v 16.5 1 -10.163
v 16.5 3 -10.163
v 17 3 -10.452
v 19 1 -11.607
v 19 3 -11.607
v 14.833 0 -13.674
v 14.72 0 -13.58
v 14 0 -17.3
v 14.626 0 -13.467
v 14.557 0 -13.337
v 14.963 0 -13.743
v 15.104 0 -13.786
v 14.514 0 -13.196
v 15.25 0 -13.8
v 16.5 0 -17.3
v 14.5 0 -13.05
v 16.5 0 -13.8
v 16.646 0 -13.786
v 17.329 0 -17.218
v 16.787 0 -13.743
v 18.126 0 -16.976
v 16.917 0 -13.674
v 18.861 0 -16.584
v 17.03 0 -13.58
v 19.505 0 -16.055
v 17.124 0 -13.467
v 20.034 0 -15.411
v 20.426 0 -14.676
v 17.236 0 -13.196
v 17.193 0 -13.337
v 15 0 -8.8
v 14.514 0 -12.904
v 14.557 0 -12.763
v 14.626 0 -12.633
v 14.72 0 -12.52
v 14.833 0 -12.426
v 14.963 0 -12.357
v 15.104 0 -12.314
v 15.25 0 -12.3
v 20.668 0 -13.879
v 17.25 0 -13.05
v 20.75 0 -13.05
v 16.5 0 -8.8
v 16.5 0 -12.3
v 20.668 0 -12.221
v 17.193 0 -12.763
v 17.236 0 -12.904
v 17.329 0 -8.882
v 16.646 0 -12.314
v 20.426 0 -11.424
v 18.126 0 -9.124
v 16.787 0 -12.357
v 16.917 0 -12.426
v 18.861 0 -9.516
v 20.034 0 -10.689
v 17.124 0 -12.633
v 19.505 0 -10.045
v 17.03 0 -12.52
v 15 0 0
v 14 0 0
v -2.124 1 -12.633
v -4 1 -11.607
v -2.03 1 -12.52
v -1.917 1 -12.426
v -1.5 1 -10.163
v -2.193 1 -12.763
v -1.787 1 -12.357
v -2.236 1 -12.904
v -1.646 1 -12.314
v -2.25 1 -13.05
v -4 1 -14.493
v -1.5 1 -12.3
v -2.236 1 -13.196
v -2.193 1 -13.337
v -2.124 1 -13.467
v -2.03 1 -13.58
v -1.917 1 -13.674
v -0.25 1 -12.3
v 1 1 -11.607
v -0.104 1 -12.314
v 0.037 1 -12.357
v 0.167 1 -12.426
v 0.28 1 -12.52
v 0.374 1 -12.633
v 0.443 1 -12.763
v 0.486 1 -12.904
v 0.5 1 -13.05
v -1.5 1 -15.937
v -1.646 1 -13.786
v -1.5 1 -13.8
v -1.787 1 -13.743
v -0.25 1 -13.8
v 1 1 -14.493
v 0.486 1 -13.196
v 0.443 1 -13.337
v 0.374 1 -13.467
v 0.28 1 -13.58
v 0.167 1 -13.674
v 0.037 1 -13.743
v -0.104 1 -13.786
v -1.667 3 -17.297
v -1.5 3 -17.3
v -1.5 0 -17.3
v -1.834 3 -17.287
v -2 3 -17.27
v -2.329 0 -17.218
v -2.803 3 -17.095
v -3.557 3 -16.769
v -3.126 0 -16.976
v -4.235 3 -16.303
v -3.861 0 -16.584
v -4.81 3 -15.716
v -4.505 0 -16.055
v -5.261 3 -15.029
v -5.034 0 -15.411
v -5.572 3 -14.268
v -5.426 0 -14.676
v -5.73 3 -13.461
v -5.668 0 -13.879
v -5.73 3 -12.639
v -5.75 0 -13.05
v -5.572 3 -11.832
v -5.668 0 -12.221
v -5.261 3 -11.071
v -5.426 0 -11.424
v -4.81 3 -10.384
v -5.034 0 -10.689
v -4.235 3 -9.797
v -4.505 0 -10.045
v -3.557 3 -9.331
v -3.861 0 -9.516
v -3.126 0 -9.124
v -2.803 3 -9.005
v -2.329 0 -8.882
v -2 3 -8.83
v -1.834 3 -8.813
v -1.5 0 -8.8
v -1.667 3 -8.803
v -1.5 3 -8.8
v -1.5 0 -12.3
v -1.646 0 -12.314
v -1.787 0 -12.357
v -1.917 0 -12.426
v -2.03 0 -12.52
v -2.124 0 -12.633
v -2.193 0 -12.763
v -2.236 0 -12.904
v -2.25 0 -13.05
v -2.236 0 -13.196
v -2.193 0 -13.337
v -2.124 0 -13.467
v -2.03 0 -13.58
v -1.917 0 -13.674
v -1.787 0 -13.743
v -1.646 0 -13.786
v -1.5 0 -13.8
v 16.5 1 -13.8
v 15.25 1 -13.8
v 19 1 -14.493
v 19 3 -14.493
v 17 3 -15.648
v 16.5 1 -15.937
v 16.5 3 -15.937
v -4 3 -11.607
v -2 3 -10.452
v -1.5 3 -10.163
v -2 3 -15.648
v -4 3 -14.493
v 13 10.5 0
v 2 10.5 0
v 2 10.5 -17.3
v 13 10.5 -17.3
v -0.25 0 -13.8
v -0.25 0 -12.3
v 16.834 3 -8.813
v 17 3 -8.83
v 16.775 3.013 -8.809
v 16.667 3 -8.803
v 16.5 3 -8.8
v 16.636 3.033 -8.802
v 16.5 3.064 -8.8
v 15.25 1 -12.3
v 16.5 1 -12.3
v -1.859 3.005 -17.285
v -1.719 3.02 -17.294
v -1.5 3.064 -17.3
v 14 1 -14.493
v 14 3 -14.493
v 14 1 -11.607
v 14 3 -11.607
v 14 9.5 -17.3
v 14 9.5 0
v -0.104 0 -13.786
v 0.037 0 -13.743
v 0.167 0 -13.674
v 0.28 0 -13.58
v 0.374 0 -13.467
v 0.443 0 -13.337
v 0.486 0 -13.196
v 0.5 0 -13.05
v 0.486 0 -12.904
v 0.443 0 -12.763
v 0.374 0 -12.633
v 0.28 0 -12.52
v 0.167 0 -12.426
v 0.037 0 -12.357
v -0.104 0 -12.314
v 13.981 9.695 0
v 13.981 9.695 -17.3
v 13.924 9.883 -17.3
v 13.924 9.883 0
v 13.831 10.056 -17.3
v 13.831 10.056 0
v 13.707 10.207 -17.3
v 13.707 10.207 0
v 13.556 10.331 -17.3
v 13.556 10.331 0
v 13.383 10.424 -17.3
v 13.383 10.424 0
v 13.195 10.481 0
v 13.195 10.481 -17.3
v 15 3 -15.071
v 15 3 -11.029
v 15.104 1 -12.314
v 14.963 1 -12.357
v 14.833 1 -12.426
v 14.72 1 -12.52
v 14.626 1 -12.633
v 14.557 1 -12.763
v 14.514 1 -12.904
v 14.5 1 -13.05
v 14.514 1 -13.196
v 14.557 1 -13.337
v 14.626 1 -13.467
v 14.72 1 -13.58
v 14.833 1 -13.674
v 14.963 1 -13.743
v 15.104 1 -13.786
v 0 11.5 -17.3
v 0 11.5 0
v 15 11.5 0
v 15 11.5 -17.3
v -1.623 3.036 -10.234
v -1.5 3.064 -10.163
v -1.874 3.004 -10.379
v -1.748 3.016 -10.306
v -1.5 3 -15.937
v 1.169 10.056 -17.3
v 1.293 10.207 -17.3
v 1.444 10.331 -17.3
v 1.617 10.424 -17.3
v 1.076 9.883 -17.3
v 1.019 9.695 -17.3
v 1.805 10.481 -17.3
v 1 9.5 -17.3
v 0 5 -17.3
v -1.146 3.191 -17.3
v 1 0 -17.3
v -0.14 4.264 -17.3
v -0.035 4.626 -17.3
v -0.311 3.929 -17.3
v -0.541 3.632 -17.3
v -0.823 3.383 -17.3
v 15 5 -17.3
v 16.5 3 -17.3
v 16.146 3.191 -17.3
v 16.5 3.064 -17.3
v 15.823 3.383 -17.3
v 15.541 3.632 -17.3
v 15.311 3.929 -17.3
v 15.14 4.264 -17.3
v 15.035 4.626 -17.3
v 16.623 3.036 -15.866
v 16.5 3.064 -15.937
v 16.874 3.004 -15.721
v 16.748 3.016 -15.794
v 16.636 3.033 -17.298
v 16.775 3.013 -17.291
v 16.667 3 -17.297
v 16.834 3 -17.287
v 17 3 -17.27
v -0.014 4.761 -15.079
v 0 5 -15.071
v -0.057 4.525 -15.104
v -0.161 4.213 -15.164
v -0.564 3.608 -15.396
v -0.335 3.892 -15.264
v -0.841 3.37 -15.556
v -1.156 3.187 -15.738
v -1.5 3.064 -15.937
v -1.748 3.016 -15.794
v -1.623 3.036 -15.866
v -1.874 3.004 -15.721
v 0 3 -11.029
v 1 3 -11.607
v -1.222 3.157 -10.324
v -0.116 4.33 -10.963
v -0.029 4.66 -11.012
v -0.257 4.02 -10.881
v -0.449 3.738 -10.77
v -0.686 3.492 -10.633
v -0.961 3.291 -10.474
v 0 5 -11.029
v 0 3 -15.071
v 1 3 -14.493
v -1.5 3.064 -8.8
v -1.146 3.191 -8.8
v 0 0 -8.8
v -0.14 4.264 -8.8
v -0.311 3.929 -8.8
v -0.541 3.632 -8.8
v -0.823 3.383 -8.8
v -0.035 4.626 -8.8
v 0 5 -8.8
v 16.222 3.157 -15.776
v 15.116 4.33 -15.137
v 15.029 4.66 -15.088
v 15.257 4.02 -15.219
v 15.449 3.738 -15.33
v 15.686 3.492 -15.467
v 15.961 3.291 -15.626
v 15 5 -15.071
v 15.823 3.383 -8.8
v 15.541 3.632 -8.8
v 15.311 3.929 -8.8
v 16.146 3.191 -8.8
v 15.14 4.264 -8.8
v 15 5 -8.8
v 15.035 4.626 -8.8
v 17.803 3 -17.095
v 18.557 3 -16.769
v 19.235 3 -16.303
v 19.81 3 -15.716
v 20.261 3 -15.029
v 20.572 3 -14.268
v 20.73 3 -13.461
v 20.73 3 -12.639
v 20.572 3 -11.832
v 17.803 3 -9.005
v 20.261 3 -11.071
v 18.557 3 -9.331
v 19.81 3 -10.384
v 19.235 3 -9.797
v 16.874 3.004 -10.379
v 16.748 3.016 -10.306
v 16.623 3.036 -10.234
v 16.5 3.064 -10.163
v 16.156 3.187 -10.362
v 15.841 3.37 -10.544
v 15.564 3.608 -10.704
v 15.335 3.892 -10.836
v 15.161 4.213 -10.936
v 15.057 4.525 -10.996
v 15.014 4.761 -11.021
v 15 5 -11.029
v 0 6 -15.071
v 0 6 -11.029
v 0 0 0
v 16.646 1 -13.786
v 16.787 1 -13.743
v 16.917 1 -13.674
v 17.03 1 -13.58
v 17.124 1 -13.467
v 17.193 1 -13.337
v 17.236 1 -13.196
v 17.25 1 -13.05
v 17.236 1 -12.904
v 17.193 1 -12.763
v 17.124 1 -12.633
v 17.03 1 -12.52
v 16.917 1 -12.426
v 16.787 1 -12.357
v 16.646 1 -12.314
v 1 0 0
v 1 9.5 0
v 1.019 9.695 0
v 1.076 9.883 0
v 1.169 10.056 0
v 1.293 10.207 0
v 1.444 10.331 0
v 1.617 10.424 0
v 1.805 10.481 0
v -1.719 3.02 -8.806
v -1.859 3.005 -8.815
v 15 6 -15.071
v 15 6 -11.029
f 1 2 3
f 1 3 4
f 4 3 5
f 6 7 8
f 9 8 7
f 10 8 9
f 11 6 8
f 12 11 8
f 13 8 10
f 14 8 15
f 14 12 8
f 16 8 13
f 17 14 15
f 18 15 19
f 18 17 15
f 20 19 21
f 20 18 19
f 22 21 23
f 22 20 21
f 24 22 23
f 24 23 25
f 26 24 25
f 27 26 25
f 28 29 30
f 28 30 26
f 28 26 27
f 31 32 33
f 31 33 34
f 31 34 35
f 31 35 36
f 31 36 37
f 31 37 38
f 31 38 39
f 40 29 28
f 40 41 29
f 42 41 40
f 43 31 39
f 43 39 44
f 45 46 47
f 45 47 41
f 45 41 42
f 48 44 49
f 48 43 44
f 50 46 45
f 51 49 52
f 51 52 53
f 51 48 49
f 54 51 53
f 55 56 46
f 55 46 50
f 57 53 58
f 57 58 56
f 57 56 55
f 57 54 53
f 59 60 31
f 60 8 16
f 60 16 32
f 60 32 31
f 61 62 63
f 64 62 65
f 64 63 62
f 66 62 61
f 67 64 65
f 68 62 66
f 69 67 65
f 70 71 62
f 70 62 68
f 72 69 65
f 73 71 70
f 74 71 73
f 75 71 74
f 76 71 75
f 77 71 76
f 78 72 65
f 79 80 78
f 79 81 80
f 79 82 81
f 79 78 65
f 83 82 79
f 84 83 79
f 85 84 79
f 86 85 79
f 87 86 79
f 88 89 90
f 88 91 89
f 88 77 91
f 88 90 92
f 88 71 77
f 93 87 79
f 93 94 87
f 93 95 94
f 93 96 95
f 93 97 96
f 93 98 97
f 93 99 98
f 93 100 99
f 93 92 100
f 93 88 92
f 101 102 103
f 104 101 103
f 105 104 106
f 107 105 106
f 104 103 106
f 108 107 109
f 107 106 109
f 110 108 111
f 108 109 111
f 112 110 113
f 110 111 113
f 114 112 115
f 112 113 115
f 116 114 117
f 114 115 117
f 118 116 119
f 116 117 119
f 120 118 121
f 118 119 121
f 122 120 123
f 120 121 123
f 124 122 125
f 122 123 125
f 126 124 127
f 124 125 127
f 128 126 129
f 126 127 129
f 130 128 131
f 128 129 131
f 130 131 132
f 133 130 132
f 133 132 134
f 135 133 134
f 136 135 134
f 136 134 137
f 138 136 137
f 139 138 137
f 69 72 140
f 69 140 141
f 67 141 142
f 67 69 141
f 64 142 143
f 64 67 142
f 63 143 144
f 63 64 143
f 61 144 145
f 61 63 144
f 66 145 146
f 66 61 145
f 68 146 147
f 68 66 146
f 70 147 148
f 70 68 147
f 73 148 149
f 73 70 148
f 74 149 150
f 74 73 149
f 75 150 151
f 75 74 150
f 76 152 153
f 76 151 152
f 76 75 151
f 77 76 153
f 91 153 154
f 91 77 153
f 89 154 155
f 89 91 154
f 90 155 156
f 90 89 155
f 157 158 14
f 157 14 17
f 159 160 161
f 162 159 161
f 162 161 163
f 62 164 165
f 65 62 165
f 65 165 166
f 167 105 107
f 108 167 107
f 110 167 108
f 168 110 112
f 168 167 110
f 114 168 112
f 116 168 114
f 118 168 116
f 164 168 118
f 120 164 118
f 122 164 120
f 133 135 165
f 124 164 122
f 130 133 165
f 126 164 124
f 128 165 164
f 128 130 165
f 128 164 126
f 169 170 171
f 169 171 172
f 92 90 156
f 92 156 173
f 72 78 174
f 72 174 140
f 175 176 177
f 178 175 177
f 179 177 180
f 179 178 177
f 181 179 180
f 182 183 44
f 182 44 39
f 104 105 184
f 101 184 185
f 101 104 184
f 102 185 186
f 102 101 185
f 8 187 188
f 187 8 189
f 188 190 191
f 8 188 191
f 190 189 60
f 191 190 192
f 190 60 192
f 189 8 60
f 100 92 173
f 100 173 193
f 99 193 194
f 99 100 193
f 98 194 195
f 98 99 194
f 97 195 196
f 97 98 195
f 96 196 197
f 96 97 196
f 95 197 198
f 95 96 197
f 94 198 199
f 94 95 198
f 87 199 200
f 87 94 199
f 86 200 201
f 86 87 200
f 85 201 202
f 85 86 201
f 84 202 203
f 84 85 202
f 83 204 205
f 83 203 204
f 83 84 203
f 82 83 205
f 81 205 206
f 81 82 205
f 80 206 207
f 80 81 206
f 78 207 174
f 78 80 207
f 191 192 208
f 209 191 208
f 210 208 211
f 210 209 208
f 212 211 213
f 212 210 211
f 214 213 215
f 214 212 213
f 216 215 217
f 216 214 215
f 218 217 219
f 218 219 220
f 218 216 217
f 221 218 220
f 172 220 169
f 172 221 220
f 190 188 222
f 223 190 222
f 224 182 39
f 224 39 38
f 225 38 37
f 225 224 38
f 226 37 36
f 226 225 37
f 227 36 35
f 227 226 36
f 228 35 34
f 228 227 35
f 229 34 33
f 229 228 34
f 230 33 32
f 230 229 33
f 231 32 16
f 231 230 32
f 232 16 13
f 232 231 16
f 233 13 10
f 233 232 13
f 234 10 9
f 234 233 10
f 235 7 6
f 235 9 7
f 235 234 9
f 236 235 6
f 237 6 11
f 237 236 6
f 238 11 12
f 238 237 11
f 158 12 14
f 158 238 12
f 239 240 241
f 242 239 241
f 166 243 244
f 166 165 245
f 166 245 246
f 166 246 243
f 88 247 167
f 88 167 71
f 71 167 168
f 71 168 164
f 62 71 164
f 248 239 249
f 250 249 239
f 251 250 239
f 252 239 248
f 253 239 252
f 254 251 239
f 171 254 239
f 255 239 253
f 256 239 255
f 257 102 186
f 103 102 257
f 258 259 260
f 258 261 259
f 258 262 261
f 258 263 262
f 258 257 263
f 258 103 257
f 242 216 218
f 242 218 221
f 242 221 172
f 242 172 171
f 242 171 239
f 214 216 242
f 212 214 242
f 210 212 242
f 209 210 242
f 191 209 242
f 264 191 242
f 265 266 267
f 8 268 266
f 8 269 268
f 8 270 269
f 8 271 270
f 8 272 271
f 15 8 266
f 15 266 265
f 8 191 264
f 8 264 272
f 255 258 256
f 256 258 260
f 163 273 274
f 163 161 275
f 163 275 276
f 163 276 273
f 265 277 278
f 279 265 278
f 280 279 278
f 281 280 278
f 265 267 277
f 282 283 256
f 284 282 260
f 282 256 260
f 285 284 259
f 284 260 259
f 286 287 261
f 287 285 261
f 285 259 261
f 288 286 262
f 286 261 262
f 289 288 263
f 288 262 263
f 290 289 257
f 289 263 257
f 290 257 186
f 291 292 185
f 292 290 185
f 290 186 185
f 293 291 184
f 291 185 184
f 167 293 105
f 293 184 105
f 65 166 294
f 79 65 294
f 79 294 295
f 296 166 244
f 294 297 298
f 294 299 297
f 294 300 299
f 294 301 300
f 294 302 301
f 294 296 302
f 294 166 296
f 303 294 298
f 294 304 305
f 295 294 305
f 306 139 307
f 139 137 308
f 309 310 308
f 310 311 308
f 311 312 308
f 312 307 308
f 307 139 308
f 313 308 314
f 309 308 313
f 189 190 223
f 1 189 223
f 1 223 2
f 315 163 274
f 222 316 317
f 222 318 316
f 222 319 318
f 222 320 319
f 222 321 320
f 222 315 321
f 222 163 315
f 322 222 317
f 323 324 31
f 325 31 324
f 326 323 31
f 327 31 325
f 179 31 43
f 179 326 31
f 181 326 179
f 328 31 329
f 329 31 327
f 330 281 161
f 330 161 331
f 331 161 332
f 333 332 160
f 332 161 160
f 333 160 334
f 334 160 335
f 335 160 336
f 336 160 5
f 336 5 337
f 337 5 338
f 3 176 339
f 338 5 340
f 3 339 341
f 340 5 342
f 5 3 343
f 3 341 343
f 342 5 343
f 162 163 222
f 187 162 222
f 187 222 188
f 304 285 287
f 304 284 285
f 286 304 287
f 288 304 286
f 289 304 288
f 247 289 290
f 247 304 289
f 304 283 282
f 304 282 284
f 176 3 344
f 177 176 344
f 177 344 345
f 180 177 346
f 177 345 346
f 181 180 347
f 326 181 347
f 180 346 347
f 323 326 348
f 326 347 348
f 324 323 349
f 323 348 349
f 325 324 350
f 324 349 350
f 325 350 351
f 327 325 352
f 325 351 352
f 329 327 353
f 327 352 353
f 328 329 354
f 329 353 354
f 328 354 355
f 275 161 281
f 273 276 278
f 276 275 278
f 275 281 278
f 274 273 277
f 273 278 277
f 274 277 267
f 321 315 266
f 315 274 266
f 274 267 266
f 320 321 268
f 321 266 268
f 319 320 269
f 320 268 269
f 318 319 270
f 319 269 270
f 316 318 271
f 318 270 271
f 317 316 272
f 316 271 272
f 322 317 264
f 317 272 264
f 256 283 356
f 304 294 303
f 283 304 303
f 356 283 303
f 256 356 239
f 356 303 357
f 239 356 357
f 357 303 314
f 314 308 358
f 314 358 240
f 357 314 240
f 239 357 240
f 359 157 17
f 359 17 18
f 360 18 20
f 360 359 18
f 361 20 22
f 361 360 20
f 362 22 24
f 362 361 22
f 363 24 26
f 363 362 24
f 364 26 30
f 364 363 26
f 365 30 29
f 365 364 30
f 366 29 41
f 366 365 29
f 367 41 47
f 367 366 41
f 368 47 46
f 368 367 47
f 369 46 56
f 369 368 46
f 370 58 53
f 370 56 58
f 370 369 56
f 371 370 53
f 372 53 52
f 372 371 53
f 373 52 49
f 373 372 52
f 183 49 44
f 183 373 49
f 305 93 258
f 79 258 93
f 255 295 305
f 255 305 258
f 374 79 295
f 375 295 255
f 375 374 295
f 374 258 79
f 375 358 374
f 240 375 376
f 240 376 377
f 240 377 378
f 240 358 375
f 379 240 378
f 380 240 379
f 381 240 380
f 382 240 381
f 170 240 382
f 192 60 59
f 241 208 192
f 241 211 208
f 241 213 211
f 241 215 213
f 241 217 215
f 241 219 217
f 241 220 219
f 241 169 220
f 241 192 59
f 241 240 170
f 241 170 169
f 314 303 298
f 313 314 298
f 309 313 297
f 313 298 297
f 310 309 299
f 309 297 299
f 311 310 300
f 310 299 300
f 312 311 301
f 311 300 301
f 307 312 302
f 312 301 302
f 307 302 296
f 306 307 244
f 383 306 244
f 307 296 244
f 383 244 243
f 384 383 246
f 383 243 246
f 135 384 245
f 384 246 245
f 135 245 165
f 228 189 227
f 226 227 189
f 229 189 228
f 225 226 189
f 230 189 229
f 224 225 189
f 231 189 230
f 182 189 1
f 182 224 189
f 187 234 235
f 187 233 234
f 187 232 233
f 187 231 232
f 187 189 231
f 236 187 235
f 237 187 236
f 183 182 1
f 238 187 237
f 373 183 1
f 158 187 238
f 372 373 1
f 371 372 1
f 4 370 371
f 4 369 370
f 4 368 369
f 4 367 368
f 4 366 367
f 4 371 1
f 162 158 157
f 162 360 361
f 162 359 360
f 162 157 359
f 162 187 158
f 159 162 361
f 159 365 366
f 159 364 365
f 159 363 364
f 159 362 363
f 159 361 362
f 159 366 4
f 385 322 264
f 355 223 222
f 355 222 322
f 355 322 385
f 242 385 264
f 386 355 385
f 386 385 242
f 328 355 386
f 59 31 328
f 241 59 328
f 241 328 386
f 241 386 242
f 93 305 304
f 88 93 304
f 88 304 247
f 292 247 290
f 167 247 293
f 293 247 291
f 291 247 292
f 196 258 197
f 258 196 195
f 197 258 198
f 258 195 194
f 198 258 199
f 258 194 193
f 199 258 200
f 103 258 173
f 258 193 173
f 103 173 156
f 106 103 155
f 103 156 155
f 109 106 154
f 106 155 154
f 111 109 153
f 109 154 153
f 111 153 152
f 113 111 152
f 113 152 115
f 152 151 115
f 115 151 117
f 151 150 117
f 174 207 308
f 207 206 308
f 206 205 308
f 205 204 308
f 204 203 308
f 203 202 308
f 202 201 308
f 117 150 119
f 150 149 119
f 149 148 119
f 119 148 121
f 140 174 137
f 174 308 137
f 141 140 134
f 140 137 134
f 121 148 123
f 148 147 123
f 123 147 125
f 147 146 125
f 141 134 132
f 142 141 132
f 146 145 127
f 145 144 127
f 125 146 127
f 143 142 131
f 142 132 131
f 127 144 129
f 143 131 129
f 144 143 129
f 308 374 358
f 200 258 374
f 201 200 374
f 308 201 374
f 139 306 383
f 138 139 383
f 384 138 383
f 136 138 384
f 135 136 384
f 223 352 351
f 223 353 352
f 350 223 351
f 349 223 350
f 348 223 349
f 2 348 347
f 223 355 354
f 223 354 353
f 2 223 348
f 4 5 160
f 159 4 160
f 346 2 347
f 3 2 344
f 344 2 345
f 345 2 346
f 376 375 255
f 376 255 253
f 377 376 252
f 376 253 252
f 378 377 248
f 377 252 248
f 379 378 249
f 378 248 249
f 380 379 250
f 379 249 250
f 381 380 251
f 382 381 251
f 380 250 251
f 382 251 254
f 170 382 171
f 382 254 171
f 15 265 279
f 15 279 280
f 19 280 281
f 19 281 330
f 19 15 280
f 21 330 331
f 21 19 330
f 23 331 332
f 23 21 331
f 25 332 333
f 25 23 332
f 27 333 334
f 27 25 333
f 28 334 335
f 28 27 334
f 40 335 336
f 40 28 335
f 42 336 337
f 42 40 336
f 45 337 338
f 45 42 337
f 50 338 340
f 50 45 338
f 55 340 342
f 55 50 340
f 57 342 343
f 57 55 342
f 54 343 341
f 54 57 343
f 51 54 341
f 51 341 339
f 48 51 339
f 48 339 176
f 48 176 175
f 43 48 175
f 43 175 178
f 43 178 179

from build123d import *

# Parameters (mm, degrees)
SKETCH1_W           = 15
SKETCH1_H           = 11.5
BOSS_EXTRUDE1_DEPTH = 17.3
SKETCH2_W           = 13
SKETCH2_H           = 10.5
CUT_EXTRUDE1_DEPTH  = 26.62303651
FILLET1_R           = 1
SKETCH7_W           = 1.5
SKETCH7_H           = 8.5
BOSS_EXTRUDE4_DEPTH = 3
BOSS_EXTRUDE5_DEPTH = 3
BOSS_EXTRUDE6_DEPTH = 3
CUT_EXTRUDE4_DEPTH  = 29.32141416
CUT_EXTRUDE5_DEPTH  = 2
FILLET6_START       = -16.47329
FILLET6_DEPTH       = 0.536538654
FILLET6_START_2     = -10.163248654
FILLET6_2_DEPTH     = 0.536538654
FILLET6_START_3     = -11.029274158
FILLET6_3_DEPTH     = 2.229274158
FILLET6_START_4     = -17.3
FILLET6_4_DEPTH     = 2.229274058
FILLET6_START_5     = 3
FILLET6_5_DEPTH     = 3


with BuildPart() as part:
    # Sketch1 → Boss-Extrude1 (new body)
    with BuildSketch(Plane.XY):
        with Locations((7.5, 5.75)):
            Rectangle(SKETCH1_W, SKETCH1_H)
    extrude(amount=-BOSS_EXTRUDE1_DEPTH)

    # Sketch2 → Cut-Extrude1 (cut, through all)
    with BuildSketch(Plane.XY):
        with Locations((7.5, 5.25)):
            Rectangle(SKETCH2_W, SKETCH2_H)
    extrude(amount=-CUT_EXTRUDE1_DEPTH, mode=Mode.SUBTRACT)

    # Fillet1
    fillet1_edges = [part.edges().sort_by_distance(p)[0] for p in [
        (1, 10.5, -8.65),
        (14, 10.5, -8.65),
    ]]
    fillet(fillet1_edges, radius=FILLET1_R)

    # Sketch7 → Boss-Extrude4 (add)
    with BuildSketch(Plane.XZ):
        with Locations((-0.75, -13.05)):
            Rectangle(SKETCH7_W, SKETCH7_H)
        with Locations((15.75, -13.05)):
            Rectangle(SKETCH7_W, SKETCH7_H)
    extrude(amount=-BOSS_EXTRUDE4_DEPTH)

    # Sketch11 → Boss-Extrude5 (add)
    with BuildSketch(Plane.XZ):
        with BuildLine():
            Line((-1.5, -8.8), (-1.5, -17.3))
            ThreePointArc((-1.5, -17.3), (-5.75, -13.05), (-1.5, -8.8))
        make_face()
    extrude(amount=-BOSS_EXTRUDE5_DEPTH)

    # Sketch12 → Boss-Extrude6 (add)
    with BuildSketch(Plane.XZ):
        with BuildLine():
            Line((14, 0), (14, -17.3))
            Line((14, -17.3), (16.5, -17.3))
            ThreePointArc((16.5, -17.3), (20.75, -13.05), (16.5, -8.8))
            Line((16.5, -8.8), (15, -8.8))
            Line((15, -8.8), (15, 0))
            Line((15, 0), (14, 0))
        make_face()
    extrude(amount=-BOSS_EXTRUDE6_DEPTH)

    # Sketch13 → Cut-Extrude4 (cut, through all)
    with BuildSketch(Plane(origin=(0, 3, 0), x_dir=(1, 0, 0), z_dir=(0, 1, 0))):
        with BuildLine():
            Line((-0.25, 12.3), (-1.5, 12.3))
            ThreePointArc((-1.5, 12.3), (-2.25, 13.05), (-1.5, 13.8))
            Line((-1.5, 13.8), (-0.25, 13.8))
            ThreePointArc((-0.25, 13.8), (0.5, 13.05), (-0.25, 12.3))
        make_face()
        with BuildLine():
            Line((15.25, 13.8), (16.5, 13.8))
            ThreePointArc((16.5, 13.8), (17.25, 13.05), (16.5, 12.3))
            Line((16.5, 12.3), (15.25, 12.3))
            ThreePointArc((15.25, 12.3), (14.5, 13.05), (15.25, 13.8))
        make_face()
    extrude(amount=-CUT_EXTRUDE4_DEPTH, mode=Mode.SUBTRACT)

    # Sketch14 → Cut-Extrude5 (cut)
    with BuildSketch(Plane(origin=(0, 3, 0), x_dir=(1, 0, 0), z_dir=(0, 1, 0))):
        Polygon((-1.5, 15.936751346), (-4, 14.493375673), (-4, 11.606624327), (-1.5, 10.163248654), (1, 11.606624327), (1, 14.493375673), align=None)
        Polygon((16.5, 15.936751346), (14, 14.493375673), (14, 11.606624327), (16.5, 10.163248654), (19, 11.606624327), (19, 14.493375673), align=None)
    extrude(amount=-CUT_EXTRUDE5_DEPTH, mode=Mode.SUBTRACT)

    # Fillet6: read off the stored shape, not the designer's step
    # Fillet6 outline → Fillet6 (add)
    with BuildSketch(Plane.XY.offset(FILLET6_START)):
        with BuildLine():
            ThreePointArc((17, 3), (15.585786438, 3.585786438), (15, 5))
            Line((15, 5), (15, 3))
            Line((15, 3), (17, 3))
        make_face()
        with BuildLine():
            ThreePointArc((0, 5), (-0.585786438, 3.585786438), (-2, 3))
            Line((-2, 3), (0, 3))
            Line((0, 3), (0, 5))
        make_face()
    extrude(amount=FILLET6_DEPTH)

    # Fillet6 2 outline → Fillet6 2 (add)
    with BuildSketch(Plane.XY.offset(FILLET6_START_2)):
        with BuildLine():
            ThreePointArc((17, 3), (15.585786438, 3.585786438), (15, 5))
            Line((15, 5), (15, 3))
            Line((15, 3), (17, 3))
        make_face()
        with BuildLine():
            ThreePointArc((0, 5), (-0.585786438, 3.585786438), (-2, 3))
            Line((-2, 3), (0, 3))
            Line((0, 3), (0, 5))
        make_face()
    extrude(amount=FILLET6_2_DEPTH)

    # Fillet6 3 outline → Fillet6 3 (add)
    with BuildSketch(Plane.XY.offset(FILLET6_START_3)):
        with BuildLine():
            ThreePointArc((17, 3), (15.585786438, 3.585786438), (15, 5))
            Line((15, 5), (15, 3))
            Line((15, 3), (17, 3))
        make_face()
        with BuildLine():
            ThreePointArc((0, 5), (-0.585786438, 3.585786438), (-2, 3))
            Line((-2, 3), (0, 3))
            Line((0, 3), (0, 5))
        make_face()
    extrude(amount=FILLET6_3_DEPTH)

    # Fillet6 4 outline → Fillet6 4 (add)
    with BuildSketch(Plane.XY.offset(FILLET6_START_4)):
        with BuildLine():
            ThreePointArc((17, 3), (15.585786438, 3.585786438), (15, 5))
            Line((15, 5), (15, 3))
            Line((15, 3), (17, 3))
        make_face()
        with BuildLine():
            ThreePointArc((0, 5), (-0.585786438, 3.585786438), (-2, 3))
            Line((-2, 3), (0, 3))
            Line((0, 3), (0, 5))
        make_face()
    extrude(amount=FILLET6_4_DEPTH)

    # Fillet6 5 outline → Fillet6 5 (cut)
    with BuildSketch(Plane(origin=(0, 0, 0), x_dir=(1, 0, 0), z_dir=(0, 1, 0)).offset(FILLET6_START_5)):
        Polygon((16.5, 15.936751346), (15, 15.070725942), (17, 15.070725942), (17, 15.648076211), align=None)
        with BuildLine():
            ThreePointArc((17, 8.829514246), (16.750435167, 8.807384978), (16.5, 8.8))
            Line((16.5, 8.8), (17, 8.8))
            Line((17, 8.8), (17, 8.829514246))
        make_face()
        with BuildLine():
            Line((17, 17.3), (16.5, 17.3))
            ThreePointArc((16.5, 17.3), (16.750435167, 17.292615022), (17, 17.270485754))
            Line((17, 17.270485754), (17, 17.3))
        make_face()
        with BuildLine():
            Line((-2, 17.3), (-2, 17.270485754))
            ThreePointArc((-2, 17.270485754), (-1.750435167, 17.292615022), (-1.5, 17.3))
            Line((-1.5, 17.3), (-2, 17.3))
        make_face()
        Polygon((-1.5, 15.936751346), (-2, 15.648076211), (-2, 15.070725942), (0, 15.070725942), align=None)
        Polygon((-2, 11.029274158), (-2, 10.451923789), (-1.5, 10.163248654), (0, 11.029274058), align=None)
        with BuildLine():
            ThreePointArc((-1.5, 8.8), (-1.750435167, 8.807384978), (-2, 8.829514246))
            Line((-2, 8.829514246), (-2, 8.8))
            Line((-2, 8.8), (-1.5, 8.8))
        make_face()
        Polygon((17, 11.029274158), (15, 11.029274158), (16.5, 10.163248654), (17, 10.451923789), align=None)
    extrude(amount=FILLET6_5_DEPTH, mode=Mode.SUBTRACT)


solid = part.part
